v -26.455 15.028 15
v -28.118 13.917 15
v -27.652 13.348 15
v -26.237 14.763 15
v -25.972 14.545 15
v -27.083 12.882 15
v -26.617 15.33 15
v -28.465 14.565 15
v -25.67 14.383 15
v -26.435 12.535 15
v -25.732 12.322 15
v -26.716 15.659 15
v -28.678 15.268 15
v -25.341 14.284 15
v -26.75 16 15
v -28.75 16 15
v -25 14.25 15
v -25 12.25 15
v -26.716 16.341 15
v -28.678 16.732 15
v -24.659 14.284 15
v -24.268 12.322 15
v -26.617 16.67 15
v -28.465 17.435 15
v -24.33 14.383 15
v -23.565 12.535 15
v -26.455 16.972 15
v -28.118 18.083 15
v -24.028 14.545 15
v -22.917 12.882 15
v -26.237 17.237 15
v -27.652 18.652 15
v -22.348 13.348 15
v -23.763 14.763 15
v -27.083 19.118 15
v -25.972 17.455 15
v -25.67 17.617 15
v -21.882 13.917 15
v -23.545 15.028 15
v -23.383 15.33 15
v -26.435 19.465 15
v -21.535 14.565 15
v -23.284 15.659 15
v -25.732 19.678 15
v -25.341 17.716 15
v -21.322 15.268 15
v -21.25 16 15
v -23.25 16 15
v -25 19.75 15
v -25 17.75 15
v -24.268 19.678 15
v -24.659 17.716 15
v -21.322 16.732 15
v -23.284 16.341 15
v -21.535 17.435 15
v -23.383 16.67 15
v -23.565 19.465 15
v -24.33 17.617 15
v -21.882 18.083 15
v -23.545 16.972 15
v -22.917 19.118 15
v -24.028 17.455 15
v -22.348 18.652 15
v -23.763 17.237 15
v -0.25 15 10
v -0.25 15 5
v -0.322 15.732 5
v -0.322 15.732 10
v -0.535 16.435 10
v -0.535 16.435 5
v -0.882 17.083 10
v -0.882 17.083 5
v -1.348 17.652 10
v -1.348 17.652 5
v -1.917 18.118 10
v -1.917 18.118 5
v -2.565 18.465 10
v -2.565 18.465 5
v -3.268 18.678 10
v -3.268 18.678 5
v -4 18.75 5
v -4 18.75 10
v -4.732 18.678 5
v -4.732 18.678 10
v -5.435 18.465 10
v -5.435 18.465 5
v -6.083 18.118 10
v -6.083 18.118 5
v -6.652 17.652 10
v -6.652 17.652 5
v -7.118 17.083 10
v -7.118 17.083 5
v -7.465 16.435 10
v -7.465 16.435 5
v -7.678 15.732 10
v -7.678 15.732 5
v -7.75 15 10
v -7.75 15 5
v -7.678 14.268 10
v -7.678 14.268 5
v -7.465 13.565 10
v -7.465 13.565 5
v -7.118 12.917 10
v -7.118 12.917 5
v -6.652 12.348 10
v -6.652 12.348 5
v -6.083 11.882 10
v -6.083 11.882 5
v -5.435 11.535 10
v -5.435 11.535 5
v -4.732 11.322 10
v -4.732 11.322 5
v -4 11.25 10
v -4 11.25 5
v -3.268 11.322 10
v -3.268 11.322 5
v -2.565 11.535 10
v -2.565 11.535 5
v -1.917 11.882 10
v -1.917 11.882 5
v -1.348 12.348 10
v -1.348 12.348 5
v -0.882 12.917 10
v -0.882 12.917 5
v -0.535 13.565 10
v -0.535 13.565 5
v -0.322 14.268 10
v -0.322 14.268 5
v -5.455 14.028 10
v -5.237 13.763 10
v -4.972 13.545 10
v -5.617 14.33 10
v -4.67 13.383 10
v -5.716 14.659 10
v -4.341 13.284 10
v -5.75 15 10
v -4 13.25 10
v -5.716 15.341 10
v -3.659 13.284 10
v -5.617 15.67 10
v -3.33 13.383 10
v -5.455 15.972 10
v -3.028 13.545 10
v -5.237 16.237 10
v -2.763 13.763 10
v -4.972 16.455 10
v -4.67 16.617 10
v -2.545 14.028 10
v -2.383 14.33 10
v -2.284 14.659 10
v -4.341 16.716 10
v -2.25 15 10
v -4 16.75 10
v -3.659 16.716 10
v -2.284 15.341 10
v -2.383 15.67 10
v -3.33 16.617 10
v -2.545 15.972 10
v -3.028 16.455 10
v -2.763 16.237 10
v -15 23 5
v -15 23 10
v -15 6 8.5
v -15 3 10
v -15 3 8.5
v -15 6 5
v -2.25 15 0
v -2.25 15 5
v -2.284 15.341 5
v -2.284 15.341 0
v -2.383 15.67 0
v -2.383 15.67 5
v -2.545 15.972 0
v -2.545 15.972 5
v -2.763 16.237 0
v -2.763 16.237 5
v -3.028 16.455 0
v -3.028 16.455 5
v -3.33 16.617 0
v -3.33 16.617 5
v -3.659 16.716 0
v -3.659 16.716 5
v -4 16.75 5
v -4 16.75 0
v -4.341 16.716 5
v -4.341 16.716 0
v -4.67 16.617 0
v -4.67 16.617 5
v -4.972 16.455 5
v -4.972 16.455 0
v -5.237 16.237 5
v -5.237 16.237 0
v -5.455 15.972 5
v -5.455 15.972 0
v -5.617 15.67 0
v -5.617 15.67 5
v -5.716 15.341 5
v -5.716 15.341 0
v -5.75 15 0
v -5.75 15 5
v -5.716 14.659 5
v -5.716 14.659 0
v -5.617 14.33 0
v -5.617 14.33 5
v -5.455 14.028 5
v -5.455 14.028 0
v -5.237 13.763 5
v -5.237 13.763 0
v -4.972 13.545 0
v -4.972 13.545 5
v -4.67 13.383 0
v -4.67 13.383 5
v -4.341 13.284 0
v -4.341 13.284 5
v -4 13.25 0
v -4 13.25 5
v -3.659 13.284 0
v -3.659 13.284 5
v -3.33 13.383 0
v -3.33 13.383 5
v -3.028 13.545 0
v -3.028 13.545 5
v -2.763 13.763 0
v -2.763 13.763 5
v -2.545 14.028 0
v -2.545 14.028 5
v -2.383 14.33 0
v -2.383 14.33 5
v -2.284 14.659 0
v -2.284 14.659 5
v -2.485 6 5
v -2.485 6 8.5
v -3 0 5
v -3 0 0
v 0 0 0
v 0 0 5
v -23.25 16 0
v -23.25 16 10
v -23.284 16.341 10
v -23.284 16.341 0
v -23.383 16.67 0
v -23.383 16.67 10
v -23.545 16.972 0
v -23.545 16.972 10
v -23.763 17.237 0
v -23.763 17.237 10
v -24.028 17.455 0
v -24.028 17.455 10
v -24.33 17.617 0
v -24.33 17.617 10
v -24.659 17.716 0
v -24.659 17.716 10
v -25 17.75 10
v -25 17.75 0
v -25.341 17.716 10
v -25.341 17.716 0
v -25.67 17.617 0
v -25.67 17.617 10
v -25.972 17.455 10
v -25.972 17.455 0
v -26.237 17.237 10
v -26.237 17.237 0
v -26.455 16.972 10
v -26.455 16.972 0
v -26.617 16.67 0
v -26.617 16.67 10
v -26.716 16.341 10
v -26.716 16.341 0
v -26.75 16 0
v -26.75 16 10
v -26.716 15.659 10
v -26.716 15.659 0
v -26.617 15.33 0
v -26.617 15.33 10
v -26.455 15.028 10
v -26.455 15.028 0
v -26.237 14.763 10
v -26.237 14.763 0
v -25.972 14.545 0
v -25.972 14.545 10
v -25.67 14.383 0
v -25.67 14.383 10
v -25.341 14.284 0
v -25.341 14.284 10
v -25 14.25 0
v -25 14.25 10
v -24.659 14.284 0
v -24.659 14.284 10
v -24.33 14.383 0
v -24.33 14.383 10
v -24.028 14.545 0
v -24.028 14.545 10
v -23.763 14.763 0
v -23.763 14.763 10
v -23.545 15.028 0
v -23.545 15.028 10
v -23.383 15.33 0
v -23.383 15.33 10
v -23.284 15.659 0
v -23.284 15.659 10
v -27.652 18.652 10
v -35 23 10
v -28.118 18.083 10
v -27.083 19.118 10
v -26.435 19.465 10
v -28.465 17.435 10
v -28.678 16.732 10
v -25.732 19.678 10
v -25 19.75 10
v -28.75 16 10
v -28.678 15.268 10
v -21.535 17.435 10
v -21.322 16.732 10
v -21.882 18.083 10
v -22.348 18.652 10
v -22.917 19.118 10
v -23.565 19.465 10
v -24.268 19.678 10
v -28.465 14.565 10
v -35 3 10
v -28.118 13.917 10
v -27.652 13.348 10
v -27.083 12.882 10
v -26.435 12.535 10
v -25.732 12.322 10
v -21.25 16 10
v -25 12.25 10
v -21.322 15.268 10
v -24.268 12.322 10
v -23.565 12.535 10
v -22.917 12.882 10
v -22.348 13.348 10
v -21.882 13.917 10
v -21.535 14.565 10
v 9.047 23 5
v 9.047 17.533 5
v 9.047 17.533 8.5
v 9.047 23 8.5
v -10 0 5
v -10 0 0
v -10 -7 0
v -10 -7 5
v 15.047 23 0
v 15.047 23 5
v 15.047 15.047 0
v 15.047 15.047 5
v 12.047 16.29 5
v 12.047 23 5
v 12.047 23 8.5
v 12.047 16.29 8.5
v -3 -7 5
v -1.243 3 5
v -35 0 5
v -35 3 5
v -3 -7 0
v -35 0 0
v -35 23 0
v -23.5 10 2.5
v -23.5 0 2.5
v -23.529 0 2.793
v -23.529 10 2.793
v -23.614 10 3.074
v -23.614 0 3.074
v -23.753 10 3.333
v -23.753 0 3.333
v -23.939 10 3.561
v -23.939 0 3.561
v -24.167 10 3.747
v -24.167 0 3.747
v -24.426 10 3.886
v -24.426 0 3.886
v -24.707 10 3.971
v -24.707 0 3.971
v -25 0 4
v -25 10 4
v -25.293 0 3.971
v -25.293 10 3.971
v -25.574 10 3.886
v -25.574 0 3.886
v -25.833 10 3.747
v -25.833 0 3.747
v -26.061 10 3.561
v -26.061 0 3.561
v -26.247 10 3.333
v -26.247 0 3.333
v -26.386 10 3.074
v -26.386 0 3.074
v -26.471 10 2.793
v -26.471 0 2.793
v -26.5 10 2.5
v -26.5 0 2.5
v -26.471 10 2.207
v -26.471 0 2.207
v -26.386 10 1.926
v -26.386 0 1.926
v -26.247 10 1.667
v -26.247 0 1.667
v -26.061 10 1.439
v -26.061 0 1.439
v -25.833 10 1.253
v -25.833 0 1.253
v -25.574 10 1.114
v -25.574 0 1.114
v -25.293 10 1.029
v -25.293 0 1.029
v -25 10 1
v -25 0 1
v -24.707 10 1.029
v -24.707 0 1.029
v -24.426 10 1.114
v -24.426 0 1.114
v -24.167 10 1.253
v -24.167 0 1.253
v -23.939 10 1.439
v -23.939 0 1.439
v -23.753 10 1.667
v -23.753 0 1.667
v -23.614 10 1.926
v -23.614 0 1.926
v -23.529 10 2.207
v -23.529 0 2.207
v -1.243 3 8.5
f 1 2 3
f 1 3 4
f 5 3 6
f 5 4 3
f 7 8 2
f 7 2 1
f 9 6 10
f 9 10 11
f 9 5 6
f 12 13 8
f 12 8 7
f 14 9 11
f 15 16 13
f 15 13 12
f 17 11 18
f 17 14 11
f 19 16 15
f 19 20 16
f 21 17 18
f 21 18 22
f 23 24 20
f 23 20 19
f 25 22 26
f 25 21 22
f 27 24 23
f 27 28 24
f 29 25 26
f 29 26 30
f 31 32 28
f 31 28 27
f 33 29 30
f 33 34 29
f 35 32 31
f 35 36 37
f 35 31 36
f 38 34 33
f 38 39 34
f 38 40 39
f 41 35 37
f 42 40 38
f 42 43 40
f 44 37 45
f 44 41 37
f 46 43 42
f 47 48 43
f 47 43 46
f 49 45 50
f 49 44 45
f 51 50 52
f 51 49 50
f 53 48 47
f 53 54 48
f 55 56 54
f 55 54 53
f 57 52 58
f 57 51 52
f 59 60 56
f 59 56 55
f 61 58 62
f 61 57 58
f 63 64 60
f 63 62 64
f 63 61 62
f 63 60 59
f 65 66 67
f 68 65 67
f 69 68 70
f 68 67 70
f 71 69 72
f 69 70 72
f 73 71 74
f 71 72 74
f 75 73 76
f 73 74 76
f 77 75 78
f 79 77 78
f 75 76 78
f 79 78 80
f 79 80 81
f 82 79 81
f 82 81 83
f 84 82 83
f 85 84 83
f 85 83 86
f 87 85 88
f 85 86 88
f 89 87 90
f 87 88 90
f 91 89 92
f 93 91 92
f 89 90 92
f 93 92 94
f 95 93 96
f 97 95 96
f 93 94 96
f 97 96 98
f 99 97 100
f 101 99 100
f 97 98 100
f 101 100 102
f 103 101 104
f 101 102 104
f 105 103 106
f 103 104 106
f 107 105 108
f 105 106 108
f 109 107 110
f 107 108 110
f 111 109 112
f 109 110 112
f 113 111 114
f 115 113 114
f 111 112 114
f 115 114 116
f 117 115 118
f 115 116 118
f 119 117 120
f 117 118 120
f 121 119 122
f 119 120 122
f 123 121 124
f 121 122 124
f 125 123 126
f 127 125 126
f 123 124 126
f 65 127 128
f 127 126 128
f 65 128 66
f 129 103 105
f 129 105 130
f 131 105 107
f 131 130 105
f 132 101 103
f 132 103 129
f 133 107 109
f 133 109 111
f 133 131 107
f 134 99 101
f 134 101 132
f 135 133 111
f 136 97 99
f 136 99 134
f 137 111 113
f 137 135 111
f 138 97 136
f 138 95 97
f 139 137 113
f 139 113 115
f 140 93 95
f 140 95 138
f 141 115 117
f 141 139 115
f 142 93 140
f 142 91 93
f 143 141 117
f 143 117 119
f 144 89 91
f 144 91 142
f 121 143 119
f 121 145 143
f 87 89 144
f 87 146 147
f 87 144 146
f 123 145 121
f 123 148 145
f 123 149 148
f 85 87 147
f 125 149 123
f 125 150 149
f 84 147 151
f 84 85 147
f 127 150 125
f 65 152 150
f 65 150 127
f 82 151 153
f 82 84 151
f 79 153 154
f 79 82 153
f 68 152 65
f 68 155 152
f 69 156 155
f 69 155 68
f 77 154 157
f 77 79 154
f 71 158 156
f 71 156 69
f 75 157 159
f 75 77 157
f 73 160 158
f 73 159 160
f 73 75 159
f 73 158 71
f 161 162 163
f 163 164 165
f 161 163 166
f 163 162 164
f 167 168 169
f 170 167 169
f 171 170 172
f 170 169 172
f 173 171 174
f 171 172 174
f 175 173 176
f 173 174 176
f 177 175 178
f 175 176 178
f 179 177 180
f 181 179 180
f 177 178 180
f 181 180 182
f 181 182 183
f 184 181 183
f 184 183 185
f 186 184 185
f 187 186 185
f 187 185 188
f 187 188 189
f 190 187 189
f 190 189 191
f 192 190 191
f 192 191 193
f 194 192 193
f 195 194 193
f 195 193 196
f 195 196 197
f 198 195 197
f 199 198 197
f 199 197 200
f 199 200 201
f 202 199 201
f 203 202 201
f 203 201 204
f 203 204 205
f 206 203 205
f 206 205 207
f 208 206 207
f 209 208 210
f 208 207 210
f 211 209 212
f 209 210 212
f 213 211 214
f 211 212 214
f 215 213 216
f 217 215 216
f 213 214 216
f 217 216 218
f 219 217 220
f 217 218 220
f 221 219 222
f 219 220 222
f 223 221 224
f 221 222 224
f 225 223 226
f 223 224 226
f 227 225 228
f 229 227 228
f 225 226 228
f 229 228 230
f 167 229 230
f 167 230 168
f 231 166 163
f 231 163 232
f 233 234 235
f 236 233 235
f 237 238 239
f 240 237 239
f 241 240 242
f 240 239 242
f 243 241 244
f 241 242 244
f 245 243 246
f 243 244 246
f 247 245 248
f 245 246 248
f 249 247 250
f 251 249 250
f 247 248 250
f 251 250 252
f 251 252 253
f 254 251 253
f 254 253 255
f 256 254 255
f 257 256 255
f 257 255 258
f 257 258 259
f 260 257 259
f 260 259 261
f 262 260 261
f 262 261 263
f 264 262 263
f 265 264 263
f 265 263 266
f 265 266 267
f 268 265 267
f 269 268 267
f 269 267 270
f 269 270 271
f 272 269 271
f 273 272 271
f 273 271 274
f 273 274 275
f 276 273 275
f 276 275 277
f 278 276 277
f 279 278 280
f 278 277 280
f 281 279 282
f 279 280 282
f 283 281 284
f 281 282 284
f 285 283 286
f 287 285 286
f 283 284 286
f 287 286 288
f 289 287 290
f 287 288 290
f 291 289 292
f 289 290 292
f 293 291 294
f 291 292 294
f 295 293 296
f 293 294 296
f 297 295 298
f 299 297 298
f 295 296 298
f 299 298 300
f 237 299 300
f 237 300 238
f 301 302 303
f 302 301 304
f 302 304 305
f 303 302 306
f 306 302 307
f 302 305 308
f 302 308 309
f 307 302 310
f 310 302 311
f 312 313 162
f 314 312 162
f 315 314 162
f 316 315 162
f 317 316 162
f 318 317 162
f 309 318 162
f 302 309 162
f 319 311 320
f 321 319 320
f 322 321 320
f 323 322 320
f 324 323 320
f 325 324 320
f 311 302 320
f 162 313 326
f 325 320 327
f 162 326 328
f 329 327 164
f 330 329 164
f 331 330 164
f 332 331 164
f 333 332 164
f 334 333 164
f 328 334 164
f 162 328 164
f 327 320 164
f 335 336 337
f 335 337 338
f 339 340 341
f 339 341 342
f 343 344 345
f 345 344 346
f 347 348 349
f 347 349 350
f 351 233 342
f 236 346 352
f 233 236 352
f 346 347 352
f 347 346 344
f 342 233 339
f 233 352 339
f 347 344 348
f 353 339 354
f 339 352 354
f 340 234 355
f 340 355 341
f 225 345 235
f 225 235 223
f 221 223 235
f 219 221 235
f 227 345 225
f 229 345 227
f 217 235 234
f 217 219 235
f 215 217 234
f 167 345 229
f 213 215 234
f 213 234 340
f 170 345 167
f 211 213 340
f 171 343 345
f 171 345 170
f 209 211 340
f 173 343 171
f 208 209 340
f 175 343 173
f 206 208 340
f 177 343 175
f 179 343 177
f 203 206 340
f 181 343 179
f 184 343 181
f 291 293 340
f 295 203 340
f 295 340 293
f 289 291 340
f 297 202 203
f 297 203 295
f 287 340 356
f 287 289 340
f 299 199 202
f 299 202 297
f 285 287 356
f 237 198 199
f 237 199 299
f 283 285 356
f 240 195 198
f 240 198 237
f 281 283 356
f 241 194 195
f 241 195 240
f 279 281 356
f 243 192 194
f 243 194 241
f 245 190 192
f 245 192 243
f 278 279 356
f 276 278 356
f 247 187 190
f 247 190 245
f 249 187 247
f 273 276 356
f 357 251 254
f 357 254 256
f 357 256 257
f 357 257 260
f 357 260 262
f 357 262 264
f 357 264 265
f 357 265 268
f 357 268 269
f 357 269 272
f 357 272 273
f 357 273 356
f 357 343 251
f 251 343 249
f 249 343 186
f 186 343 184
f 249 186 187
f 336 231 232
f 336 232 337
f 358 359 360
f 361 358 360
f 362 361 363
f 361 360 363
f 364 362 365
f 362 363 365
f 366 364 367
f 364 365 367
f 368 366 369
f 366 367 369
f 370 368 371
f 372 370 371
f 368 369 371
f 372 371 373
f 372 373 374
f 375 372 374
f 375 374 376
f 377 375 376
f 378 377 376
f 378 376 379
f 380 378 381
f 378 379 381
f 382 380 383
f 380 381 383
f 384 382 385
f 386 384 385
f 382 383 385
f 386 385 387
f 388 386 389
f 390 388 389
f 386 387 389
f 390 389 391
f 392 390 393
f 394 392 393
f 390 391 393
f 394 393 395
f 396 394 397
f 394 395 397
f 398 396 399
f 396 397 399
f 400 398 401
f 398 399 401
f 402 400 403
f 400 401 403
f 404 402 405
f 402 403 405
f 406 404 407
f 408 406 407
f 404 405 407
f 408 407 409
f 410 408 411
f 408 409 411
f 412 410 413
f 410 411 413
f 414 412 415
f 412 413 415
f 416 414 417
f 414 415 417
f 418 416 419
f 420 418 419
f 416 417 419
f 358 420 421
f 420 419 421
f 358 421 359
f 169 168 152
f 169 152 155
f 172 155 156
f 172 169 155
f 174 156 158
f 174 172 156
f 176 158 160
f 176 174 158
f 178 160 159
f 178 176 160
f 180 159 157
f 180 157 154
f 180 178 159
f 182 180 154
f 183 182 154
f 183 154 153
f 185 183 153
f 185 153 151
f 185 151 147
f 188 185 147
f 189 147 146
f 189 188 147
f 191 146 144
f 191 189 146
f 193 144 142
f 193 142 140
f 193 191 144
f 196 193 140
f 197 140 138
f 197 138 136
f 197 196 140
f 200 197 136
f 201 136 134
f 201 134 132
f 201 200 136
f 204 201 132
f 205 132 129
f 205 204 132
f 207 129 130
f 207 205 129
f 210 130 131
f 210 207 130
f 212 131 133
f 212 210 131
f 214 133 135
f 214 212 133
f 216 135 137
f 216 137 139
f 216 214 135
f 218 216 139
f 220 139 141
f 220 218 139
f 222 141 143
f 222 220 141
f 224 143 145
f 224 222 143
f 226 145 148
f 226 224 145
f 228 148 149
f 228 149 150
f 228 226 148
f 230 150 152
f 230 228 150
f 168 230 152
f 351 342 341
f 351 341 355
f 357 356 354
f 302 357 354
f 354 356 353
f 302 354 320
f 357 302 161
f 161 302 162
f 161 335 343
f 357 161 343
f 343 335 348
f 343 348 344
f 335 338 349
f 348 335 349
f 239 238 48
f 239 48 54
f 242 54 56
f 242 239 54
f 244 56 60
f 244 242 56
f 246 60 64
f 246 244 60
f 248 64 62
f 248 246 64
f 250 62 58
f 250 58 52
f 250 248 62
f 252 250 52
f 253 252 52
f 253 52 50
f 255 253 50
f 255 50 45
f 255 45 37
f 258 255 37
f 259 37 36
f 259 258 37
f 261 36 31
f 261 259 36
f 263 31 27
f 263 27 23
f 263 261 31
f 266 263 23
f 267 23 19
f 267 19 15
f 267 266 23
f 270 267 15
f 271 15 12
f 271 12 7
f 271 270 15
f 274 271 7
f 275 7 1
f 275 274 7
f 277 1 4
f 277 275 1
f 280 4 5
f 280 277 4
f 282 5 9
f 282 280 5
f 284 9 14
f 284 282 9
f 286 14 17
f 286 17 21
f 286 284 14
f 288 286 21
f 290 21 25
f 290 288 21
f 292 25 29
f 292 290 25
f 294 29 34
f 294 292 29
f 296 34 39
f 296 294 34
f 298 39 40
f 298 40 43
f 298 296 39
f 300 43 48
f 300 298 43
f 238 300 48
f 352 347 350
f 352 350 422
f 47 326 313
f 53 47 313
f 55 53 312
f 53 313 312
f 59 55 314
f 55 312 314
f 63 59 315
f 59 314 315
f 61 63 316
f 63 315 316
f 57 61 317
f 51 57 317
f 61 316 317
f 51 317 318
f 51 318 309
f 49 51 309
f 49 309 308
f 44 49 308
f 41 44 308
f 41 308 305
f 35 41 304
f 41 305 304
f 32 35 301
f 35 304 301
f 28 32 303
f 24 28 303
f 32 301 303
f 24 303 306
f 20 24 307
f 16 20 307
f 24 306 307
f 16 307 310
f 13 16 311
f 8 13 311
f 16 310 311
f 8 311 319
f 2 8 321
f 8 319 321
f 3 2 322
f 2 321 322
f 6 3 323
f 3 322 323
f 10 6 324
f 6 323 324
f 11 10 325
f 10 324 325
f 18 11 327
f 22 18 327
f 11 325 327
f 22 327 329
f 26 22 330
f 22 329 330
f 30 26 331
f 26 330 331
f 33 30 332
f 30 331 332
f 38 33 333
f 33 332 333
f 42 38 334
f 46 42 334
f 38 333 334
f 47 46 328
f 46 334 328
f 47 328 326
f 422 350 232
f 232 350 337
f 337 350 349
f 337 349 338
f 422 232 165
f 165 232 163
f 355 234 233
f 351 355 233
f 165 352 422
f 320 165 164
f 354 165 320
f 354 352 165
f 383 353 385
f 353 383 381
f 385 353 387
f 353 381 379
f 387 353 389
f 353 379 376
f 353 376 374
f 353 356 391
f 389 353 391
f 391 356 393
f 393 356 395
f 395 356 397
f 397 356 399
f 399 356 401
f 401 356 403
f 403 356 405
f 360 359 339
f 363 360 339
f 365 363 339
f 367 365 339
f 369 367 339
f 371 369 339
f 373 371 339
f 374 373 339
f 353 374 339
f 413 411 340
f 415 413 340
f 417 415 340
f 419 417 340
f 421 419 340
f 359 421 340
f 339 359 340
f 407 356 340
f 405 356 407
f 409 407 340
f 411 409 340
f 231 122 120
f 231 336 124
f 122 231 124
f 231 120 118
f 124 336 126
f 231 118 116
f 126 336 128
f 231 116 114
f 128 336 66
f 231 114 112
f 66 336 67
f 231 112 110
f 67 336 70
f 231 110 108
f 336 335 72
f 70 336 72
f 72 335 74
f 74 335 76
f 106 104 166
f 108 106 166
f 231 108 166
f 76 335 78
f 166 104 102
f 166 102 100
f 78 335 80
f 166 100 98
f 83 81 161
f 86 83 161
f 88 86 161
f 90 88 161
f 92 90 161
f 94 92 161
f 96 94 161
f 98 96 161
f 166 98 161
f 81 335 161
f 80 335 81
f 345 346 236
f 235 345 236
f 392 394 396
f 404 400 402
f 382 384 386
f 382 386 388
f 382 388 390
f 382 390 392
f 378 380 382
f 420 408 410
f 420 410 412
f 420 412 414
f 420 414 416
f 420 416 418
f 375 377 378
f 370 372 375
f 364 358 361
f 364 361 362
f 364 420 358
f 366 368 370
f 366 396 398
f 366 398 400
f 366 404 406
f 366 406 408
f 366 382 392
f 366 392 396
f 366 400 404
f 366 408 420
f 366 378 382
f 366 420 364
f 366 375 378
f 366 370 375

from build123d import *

# Parameters (mm, degrees)
BOSS_EXTRUDE1_DEPTH = 23
SKETCH2_R           = 1.75
CUT_EXTRUDE1_DEPTH  = 11
SKETCH3_R           = 1.5
CUT_EXTRUDE2_DEPTH  = 10
SKETCH4_W           = 7
SKETCH4_H           = 5
BOSS_EXTRUDE2_DEPTH = 7
SKETCH5_R           = 3.75
SKETCH5_R_2         = 1.75
BOSS_EXTRUDE3_DEPTH = 5
SKETCH6_R           = 3.75
SKETCH6_R_2         = 1.75
BOSS_EXTRUDE4_DEPTH = 5
BOSS_EXTRUDE5_DEPTH = 5
BOSS_EXTRUDE6_DEPTH = 3.5
SKETCH9_W           = 5
SKETCH9_H           = 3
CUT_EXTRUDE3_DEPTH  = 20


with BuildPart() as part:
    # Sketch1 → Boss-Extrude1 (new body)
    with BuildSketch(Plane(origin=(0, 0, 0), x_dir=(1, 0, 0), z_dir=(0, 1, 0))):
        Polygon((0, 0), (-18, 0), (-22, 0), (-35, 0), (-35, -5), (-35, -10), (-15, -10), (-15, -5), (0, -5), align=None)
    extrude(amount=BOSS_EXTRUDE1_DEPTH)

    # Sketch2 → Cut-Extrude1 (cut, through all)
    with BuildSketch(Plane.XY.offset(10)):
        with Locations((-25, 16)):
            Circle(SKETCH2_R)
        with Locations((-4, 15)):
            Circle(SKETCH2_R)
    extrude(amount=-CUT_EXTRUDE1_DEPTH, mode=Mode.SUBTRACT)

    # Sketch3 → Cut-Extrude2 (cut)
    with BuildSketch(Plane.XZ):
        with Locations((-25, 2.5)):
            Circle(SKETCH3_R)
    extrude(amount=-CUT_EXTRUDE2_DEPTH, mode=Mode.SUBTRACT)

    # Sketch4 → Boss-Extrude2 (add)
    with BuildSketch(Plane.XZ):
        with Locations((-6.5, 2.5)):
            Rectangle(SKETCH4_W, SKETCH4_H)
    extrude(amount=BOSS_EXTRUDE2_DEPTH)

    # Sketch5 → Boss-Extrude3 (add)
    with BuildSketch(Plane.XY.offset(10)):
        with Locations((-25, 16)):
            Circle(SKETCH5_R)
        with Locations((-25, 16)):
            Circle(SKETCH5_R_2, mode=Mode.SUBTRACT)
    extrude(amount=BOSS_EXTRUDE3_DEPTH)

    # Sketch6 → Boss-Extrude4 (add)
    with BuildSketch(Plane.XY.offset(5)):
        with Locations((-4, 15)):
            Circle(SKETCH6_R)
        with Locations((-4, 15)):
            Circle(SKETCH6_R_2, mode=Mode.SUBTRACT)
    extrude(amount=BOSS_EXTRUDE4_DEPTH)

    # Sketch7 → Boss-Extrude5 (add)
    with BuildSketch(Plane.XY.offset(5)):
        Polygon((0, 0), (0, 23), (15.047232304, 23), (15.047232304, 15.047232304), align=None)
    extrude(amount=-BOSS_EXTRUDE5_DEPTH)

    # Sketch8 → Boss-Extrude6 (add)
    with BuildSketch(Plane.XY.offset(5)):
        Polygon((12.047232304, 23), (12.047232304, 16.289872991), (-1.242640687, 3), (-15, 3), (-15, 6), (-2.485281374, 6), (9.047232304, 17.532513678), (9.047232304, 23), align=None)
    extrude(amount=BOSS_EXTRUDE6_DEPTH)

    # Sketch9 → Cut-Extrude3 (cut)
    with BuildSketch(Plane(origin=(-15, 0, 0), x_dir=(0, 0, -1), z_dir=(1, 0, 0))):
        with Locations((-7.5, 1.5)):
            Rectangle(SKETCH9_W, SKETCH9_H)
    extrude(amount=-CUT_EXTRUDE3_DEPTH, mode=Mode.SUBTRACT)


solid = part.part
